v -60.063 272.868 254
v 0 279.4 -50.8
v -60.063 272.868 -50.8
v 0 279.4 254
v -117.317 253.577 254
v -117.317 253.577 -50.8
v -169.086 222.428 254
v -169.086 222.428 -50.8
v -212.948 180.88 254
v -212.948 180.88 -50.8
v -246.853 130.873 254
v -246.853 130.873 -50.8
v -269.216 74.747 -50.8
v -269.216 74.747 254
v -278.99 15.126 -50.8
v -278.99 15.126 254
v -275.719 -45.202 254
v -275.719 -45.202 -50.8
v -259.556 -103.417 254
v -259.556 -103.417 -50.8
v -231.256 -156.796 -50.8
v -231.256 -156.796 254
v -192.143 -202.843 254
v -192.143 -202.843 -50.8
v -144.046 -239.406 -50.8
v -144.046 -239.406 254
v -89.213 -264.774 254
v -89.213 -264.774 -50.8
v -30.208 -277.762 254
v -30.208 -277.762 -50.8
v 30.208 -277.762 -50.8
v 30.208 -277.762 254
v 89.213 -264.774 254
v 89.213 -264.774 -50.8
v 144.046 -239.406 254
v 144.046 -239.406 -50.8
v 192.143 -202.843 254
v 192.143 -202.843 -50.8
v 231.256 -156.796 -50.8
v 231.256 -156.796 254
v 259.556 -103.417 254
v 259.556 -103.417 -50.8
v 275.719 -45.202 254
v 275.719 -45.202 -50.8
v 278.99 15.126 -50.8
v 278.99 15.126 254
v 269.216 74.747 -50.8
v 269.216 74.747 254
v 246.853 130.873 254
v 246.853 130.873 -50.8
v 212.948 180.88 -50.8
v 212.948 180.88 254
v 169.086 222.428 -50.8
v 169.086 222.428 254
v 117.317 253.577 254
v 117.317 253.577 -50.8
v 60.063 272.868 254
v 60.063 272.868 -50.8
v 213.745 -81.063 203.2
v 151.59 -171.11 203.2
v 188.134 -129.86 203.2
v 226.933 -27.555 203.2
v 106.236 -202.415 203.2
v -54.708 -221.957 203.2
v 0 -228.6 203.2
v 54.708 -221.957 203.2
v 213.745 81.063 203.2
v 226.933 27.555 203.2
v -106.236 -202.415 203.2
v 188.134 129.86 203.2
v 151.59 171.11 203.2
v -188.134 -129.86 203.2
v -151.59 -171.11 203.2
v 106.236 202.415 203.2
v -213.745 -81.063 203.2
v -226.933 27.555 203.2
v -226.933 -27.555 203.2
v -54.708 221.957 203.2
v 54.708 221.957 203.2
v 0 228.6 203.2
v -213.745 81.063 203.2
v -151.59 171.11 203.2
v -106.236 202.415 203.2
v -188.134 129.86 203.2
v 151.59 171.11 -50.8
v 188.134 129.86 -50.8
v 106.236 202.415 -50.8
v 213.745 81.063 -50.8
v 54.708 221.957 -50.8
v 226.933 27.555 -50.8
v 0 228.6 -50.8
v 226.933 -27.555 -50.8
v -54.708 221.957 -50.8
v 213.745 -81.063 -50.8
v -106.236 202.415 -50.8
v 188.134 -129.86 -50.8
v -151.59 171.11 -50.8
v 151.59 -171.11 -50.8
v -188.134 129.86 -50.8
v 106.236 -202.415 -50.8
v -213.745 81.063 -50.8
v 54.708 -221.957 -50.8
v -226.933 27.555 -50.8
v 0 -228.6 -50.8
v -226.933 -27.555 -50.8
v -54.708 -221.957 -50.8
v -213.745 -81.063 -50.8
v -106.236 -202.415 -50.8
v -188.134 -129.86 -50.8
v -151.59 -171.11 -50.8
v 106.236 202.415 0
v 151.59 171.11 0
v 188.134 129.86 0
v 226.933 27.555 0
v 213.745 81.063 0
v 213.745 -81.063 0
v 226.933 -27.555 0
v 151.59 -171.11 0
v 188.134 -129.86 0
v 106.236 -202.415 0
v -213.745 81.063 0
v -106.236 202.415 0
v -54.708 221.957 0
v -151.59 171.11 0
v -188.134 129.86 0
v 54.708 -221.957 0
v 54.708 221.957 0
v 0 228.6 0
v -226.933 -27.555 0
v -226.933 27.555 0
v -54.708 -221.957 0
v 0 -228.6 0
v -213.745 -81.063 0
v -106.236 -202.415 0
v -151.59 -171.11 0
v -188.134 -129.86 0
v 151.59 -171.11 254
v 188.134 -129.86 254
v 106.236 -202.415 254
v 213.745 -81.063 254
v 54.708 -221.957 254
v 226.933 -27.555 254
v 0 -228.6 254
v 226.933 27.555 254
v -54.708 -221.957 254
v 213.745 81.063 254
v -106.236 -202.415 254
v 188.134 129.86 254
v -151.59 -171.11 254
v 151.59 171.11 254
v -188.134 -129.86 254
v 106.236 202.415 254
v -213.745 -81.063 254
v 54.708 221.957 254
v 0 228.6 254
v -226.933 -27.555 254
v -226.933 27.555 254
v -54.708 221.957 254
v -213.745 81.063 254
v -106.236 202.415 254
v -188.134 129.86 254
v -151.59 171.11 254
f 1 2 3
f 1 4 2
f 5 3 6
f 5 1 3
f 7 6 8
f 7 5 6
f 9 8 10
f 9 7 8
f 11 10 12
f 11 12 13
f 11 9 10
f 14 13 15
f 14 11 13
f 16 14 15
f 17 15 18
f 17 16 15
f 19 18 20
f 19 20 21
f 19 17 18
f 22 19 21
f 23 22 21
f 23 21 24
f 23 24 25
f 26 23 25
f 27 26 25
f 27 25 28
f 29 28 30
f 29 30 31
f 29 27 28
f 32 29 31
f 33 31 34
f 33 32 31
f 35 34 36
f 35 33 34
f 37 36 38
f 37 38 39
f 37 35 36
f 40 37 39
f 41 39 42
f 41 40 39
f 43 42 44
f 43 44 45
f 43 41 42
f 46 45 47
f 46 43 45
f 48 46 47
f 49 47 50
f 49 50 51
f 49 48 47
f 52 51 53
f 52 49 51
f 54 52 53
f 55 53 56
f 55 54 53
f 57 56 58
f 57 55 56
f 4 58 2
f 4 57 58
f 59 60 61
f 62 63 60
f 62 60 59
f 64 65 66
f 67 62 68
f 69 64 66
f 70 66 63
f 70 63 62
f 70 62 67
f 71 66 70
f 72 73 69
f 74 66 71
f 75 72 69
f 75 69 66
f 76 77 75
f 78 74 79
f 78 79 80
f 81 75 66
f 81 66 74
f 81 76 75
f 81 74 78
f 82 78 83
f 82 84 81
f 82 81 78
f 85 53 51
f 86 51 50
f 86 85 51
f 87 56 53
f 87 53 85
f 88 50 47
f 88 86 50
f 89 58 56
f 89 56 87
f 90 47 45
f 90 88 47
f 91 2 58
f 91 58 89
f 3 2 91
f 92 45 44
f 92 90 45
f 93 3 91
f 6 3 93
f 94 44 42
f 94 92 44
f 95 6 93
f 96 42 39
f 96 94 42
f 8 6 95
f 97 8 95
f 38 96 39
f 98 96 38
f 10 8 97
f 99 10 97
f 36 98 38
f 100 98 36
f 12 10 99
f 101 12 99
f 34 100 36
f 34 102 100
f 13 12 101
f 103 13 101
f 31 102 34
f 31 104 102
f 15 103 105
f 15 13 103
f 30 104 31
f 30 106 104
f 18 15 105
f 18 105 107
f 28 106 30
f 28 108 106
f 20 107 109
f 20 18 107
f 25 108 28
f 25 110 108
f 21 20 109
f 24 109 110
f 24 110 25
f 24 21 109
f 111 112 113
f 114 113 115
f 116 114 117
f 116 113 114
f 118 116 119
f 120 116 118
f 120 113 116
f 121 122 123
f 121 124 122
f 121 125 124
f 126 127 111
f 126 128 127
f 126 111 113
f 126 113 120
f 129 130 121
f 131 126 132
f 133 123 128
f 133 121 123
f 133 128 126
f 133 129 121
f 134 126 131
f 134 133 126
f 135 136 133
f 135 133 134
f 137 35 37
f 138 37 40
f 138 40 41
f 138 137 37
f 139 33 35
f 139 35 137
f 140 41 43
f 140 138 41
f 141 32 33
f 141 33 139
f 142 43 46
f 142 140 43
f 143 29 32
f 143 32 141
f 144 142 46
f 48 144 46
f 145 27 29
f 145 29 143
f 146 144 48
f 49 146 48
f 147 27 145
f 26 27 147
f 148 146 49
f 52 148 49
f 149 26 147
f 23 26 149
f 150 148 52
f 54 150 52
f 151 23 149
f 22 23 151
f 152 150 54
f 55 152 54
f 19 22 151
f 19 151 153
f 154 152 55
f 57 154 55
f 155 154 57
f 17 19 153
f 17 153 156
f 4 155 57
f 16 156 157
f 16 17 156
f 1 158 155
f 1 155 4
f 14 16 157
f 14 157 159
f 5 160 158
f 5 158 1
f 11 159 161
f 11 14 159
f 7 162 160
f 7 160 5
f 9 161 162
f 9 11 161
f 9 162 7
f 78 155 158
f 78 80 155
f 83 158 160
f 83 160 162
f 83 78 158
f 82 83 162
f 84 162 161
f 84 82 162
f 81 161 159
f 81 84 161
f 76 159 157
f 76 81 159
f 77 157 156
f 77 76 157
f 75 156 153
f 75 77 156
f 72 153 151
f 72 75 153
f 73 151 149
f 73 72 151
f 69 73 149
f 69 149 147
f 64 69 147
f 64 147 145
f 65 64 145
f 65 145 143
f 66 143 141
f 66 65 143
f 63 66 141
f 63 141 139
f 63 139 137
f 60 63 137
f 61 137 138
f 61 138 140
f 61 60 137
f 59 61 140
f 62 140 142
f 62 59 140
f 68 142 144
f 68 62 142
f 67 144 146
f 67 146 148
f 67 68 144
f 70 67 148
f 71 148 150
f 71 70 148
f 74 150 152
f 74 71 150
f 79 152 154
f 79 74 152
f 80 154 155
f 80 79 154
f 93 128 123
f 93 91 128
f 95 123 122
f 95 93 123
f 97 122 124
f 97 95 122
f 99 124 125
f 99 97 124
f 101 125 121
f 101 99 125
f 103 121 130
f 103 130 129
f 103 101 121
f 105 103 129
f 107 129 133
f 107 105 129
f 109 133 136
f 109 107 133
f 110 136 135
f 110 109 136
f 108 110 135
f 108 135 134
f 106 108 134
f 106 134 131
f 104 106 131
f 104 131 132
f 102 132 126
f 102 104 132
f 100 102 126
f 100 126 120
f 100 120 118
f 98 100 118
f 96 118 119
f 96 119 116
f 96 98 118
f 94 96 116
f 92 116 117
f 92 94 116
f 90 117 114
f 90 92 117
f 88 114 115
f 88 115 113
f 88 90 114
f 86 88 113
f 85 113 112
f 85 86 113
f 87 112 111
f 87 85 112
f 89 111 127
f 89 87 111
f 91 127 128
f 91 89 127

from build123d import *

# Parameters (mm, degrees)
F0_W   = 228.6
F0_H   = 203.2
F0_W_2 = 25.4


with BuildPart() as f1:
    # F0 (on Right) → F1 (revolve)
    with BuildSketch(Plane.YZ):
        with Locations((114.3, 101.6)):
            Rectangle(F0_W, F0_H)
        with Locations((241.3, 101.6)):
            Rectangle(F0_W_2, F0_H)
        Polygon((254, 0), (228.6, 0), (228.6, -50.8), (279.4, -50.8), (279.4, 254), (228.6, 254), (228.6, 203.2), (254, 203.2), align=None)
    revolve(axis=Axis((0, 0, 101.6), (0, 0, 1)))


solid = f1.part
